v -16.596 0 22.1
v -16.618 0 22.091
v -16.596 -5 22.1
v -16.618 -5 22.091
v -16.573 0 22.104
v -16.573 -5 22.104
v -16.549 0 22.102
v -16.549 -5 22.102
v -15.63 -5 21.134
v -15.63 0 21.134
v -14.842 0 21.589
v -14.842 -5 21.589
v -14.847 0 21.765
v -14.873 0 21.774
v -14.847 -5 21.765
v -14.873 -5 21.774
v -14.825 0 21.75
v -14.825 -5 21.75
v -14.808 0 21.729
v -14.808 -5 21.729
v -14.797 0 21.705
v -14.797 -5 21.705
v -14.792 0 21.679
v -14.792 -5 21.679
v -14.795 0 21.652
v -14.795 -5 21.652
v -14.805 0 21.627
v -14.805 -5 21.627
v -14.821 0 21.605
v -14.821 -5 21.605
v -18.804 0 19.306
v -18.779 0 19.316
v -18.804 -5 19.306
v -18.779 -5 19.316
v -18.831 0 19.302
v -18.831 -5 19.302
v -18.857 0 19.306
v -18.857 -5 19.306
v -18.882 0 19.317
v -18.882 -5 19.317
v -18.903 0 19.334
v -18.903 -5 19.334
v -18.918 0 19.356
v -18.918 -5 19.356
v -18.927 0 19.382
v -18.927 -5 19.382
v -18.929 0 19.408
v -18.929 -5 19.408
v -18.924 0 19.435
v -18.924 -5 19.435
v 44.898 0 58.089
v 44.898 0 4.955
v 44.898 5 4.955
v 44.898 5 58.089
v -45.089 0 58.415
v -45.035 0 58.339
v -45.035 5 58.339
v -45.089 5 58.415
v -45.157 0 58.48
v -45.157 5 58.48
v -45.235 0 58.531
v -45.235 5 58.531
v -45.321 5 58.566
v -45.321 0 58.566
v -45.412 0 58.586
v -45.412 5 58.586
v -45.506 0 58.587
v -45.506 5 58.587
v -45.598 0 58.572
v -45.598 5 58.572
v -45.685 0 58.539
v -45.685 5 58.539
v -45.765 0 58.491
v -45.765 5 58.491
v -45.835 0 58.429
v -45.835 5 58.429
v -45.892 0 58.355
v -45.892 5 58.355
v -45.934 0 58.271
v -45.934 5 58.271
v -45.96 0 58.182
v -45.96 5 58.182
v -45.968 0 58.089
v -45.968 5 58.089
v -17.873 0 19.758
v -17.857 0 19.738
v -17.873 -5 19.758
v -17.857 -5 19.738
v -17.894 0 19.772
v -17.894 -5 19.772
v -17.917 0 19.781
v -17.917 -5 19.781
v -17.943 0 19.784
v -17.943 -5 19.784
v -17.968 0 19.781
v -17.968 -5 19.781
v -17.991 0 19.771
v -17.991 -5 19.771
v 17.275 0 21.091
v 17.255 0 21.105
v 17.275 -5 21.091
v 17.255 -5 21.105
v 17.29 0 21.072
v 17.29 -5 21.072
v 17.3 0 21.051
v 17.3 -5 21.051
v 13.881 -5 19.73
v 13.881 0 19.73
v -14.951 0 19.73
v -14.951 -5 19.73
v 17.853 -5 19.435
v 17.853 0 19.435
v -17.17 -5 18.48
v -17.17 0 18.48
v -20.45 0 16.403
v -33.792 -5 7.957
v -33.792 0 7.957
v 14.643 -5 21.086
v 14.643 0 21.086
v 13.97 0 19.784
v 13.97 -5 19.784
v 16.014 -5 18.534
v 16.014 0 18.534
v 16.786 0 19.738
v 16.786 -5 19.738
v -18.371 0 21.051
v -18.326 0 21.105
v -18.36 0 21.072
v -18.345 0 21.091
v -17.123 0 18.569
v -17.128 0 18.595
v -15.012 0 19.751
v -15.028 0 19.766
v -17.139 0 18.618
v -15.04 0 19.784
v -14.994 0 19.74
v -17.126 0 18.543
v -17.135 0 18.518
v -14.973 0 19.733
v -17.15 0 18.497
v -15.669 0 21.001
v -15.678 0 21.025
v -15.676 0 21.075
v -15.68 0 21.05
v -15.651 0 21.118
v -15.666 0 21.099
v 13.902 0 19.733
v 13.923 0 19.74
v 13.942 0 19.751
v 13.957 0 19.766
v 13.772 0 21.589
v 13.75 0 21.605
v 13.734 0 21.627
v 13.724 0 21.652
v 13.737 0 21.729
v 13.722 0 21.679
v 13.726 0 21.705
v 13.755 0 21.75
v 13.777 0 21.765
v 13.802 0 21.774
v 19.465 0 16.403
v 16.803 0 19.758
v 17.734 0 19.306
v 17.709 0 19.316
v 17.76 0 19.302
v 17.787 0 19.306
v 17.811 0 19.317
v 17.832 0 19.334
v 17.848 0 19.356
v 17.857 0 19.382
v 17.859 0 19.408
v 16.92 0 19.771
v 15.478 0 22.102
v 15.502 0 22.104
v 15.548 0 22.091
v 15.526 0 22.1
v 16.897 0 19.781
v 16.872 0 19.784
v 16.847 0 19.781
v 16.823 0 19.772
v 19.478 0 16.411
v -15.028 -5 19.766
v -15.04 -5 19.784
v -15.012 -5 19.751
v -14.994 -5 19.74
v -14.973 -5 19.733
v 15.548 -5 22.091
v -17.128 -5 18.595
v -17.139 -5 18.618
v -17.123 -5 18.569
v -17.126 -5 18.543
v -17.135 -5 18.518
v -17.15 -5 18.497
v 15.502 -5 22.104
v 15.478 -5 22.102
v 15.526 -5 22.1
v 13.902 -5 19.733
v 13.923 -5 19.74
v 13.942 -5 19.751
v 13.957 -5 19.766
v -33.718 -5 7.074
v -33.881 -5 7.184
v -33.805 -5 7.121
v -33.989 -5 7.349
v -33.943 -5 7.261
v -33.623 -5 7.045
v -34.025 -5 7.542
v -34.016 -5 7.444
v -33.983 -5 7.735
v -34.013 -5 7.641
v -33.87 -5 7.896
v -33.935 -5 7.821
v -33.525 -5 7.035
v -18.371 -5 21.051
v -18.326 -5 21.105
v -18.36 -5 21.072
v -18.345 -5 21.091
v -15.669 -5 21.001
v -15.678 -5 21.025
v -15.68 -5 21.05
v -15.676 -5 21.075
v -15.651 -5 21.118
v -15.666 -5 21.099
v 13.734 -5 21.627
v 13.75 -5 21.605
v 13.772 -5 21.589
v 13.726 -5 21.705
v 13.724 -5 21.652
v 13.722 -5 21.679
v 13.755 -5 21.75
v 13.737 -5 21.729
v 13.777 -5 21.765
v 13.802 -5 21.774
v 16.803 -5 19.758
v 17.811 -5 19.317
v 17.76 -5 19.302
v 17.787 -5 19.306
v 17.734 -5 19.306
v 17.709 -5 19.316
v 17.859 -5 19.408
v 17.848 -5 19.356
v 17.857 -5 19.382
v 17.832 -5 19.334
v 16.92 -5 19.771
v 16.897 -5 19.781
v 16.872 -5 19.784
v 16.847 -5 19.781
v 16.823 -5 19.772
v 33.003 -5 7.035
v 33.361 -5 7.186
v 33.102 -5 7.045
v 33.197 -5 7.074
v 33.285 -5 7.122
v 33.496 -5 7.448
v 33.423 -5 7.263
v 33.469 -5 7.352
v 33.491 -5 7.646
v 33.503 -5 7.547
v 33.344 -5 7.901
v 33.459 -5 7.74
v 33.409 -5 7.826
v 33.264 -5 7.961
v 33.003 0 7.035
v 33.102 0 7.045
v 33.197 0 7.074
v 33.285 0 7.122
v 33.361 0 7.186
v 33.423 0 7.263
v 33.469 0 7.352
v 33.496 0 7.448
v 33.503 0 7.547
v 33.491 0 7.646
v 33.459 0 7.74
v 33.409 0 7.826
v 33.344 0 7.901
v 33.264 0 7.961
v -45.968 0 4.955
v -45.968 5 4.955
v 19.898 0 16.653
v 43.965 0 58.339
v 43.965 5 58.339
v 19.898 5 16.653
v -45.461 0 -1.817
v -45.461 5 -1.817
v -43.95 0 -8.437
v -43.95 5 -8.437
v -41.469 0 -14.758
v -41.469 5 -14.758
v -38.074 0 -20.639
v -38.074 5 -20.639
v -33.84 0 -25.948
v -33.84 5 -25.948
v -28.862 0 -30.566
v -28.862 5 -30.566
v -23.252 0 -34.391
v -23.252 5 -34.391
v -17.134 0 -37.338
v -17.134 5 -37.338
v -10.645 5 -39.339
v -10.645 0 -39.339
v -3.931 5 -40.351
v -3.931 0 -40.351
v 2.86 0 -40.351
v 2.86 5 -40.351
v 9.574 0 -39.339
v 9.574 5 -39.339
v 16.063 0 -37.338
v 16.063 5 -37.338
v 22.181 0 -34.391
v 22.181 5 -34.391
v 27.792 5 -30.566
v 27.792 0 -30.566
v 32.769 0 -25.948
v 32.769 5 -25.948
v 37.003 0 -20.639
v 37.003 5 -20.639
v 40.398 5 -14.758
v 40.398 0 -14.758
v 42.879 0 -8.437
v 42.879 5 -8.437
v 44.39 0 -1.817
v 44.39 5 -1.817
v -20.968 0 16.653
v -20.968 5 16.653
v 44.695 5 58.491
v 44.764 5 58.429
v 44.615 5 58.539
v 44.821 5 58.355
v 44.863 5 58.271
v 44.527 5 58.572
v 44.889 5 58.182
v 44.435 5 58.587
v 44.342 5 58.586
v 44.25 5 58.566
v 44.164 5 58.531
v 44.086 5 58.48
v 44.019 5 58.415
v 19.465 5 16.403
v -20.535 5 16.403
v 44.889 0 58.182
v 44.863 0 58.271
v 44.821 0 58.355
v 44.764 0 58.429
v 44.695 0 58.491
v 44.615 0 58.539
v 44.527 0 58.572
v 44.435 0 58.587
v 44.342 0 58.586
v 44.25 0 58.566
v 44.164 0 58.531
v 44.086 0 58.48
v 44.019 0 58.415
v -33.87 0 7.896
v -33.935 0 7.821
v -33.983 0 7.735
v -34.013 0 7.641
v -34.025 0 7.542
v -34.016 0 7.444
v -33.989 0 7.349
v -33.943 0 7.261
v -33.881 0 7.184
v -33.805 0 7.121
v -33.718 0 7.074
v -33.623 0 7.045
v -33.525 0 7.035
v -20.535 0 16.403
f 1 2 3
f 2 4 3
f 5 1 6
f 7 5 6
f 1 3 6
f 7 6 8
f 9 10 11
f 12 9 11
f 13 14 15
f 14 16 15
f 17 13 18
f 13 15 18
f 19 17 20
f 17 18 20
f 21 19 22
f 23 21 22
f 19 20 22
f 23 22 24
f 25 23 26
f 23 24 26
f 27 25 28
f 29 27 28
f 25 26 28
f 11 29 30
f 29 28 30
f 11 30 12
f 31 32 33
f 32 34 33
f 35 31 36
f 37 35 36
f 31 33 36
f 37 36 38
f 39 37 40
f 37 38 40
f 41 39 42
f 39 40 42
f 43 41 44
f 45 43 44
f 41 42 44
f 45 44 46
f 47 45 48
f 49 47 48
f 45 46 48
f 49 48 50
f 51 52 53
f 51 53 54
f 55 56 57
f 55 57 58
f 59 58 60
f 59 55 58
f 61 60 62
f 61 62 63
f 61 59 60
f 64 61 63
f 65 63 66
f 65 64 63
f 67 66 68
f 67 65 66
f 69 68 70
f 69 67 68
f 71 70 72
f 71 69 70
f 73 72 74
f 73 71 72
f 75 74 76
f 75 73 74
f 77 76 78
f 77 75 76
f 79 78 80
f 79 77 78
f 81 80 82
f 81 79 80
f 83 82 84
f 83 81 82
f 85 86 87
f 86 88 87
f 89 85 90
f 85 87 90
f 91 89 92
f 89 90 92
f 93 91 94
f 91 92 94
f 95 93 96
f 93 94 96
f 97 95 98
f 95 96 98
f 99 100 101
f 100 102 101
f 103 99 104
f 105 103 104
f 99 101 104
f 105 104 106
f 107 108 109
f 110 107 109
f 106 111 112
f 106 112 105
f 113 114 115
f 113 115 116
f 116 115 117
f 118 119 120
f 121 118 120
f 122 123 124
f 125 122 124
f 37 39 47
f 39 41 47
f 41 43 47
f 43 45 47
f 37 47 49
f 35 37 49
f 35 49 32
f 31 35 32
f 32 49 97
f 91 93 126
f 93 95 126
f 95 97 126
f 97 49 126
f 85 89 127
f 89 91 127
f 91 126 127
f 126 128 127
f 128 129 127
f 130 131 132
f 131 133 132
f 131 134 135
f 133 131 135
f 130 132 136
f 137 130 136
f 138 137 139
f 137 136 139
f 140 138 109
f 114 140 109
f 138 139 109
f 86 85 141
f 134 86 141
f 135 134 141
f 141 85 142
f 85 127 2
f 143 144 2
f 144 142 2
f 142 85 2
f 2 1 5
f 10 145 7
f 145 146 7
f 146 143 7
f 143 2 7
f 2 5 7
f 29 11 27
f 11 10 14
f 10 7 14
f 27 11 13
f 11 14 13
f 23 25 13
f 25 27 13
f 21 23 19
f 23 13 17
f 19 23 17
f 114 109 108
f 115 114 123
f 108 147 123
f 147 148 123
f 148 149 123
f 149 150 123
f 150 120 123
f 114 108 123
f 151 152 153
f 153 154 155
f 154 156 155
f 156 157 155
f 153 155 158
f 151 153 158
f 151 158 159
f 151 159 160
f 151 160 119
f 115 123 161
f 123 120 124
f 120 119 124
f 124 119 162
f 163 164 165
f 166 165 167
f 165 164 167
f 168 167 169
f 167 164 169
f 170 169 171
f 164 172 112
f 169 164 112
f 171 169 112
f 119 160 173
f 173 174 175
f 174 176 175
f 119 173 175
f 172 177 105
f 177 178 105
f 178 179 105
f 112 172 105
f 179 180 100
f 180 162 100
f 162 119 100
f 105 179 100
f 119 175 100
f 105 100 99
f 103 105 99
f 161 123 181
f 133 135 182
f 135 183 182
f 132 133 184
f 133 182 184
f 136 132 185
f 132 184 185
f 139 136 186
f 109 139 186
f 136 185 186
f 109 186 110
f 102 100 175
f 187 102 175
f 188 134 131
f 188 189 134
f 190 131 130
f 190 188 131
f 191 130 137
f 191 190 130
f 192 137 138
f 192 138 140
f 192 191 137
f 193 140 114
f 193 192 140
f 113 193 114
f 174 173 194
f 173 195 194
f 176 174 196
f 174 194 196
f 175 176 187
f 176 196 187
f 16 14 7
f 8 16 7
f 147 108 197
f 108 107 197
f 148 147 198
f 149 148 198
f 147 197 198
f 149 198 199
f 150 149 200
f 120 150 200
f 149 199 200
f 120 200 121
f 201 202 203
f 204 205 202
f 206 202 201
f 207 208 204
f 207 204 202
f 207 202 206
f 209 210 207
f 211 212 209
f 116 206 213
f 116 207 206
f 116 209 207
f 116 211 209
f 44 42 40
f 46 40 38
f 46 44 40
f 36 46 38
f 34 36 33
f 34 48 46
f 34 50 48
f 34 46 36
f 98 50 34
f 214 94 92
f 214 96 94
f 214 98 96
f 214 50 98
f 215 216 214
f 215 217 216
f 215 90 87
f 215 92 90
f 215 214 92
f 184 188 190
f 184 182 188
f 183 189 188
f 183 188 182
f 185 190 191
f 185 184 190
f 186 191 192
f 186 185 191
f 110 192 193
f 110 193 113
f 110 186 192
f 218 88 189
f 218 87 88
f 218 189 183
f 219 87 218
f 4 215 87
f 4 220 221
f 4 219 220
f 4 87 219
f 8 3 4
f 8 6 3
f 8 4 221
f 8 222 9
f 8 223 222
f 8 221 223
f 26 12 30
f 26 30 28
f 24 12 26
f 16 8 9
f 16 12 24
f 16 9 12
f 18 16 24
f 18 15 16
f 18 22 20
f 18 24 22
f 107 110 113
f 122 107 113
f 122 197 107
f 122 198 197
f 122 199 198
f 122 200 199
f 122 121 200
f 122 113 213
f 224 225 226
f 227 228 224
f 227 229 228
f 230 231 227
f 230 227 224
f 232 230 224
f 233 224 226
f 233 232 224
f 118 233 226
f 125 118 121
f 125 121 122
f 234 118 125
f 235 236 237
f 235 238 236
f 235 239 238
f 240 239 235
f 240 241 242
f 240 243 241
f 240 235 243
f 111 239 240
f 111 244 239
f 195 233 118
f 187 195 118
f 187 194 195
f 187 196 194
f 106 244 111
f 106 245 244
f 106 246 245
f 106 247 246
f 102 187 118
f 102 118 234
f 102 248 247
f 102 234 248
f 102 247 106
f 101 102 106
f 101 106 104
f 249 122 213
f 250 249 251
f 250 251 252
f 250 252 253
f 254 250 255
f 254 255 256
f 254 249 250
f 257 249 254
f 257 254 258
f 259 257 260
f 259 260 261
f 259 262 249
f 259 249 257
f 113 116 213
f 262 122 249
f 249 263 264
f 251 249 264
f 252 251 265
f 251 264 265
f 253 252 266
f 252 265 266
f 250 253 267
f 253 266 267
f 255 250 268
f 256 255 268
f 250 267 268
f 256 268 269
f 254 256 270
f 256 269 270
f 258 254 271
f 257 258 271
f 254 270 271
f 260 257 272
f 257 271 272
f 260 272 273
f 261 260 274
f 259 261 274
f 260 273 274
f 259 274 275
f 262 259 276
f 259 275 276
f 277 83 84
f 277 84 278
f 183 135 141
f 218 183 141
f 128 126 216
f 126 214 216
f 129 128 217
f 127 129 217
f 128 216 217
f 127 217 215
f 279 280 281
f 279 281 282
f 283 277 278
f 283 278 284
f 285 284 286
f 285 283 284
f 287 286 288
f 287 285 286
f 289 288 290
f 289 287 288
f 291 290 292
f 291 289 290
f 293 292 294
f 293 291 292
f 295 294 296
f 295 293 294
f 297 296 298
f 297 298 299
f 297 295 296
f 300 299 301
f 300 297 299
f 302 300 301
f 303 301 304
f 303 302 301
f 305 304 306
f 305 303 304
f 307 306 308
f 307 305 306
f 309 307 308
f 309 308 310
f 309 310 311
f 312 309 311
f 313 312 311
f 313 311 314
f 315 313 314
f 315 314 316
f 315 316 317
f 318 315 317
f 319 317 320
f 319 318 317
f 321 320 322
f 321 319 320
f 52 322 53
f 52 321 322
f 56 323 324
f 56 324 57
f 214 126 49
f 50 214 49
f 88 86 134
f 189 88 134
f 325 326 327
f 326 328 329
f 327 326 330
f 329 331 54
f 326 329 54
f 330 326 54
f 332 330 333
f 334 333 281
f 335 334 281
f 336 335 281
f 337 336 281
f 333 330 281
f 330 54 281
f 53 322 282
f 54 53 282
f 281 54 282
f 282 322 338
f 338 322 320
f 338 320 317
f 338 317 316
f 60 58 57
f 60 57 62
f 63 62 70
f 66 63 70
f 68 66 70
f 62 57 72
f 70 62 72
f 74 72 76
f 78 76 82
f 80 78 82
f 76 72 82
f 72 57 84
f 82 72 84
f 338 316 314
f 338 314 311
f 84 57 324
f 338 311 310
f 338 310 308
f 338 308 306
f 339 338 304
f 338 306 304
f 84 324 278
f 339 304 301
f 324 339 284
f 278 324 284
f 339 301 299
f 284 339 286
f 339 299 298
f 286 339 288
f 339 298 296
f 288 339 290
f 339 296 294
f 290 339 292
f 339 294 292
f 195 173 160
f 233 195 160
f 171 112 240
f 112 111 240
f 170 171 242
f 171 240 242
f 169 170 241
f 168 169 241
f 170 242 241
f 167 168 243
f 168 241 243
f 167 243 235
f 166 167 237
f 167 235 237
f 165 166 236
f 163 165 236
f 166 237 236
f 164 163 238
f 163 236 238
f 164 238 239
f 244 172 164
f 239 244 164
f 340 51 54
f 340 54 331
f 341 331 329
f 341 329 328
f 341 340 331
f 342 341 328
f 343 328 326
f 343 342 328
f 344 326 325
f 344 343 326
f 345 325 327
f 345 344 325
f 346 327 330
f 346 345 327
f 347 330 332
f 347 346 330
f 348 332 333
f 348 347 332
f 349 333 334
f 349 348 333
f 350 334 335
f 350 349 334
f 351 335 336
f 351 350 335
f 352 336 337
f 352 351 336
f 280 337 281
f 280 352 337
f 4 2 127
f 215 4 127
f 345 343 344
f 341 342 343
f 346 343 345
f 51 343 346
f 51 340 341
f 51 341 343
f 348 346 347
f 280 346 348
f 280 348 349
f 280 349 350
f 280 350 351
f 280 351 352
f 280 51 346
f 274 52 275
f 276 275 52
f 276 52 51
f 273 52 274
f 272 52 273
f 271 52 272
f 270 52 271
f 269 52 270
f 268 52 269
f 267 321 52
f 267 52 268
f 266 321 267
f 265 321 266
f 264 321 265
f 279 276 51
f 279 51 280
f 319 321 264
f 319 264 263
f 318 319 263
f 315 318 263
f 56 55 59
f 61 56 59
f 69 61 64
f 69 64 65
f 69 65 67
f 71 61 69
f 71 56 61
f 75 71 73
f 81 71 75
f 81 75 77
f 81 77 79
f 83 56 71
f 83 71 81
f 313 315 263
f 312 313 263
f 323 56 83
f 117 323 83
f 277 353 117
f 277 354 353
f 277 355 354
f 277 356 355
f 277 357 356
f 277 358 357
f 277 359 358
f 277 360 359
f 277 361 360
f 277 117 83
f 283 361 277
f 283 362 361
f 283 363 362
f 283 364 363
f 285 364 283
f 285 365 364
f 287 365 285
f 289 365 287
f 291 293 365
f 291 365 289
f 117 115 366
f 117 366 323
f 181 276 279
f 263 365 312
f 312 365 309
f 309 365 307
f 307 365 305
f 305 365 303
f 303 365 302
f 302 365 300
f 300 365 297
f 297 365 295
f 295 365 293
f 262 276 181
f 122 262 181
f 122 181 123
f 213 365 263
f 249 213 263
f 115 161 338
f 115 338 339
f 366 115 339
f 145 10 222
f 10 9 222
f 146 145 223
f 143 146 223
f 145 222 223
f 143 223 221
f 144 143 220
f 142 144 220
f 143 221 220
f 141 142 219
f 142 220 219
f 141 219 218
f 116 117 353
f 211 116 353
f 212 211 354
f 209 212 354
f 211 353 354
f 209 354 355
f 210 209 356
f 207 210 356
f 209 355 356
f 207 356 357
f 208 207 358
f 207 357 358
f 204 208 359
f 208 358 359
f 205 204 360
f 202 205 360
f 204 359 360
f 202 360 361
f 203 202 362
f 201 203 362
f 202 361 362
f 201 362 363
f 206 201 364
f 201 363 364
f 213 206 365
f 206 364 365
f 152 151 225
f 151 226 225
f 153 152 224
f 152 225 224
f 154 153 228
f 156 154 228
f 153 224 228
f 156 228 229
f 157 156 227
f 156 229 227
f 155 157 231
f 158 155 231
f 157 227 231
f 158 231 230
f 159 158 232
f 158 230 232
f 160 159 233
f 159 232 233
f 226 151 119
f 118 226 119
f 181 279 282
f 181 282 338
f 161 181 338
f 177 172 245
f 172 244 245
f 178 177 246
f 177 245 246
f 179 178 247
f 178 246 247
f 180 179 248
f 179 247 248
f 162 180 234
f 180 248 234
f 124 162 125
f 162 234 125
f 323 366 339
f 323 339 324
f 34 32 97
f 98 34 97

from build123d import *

# Parameters (mm, degrees)
BOSS_EXTRU_1_DEPTH = 5
BOSS_EXTRU_2_DEPTH = 5
CONG_1_R           = 0.1


with BuildPart() as part:
    # Esquisse1 → Boss.-Extru.1 (new body)
    with BuildSketch(Plane(origin=(0, 0, 0), x_dir=(1, 0, 0), z_dir=(0, 1, 0))):
        with BuildLine():
            Line((19.464682141, -16.403463282), (-20.535317859, -16.403463282))
            Line((-20.535317859, -16.403463282), (-20.968330561, -16.653463282))
            Line((-20.968330561, -16.653463282), (-45.035317859, -58.338708067))
            ThreePointArc((-45.035317859, -58.338708067), (-45.597740084, -58.57167098), (-45.968330561, -58.088708067))
            Line((-45.968330561, -58.088708067), (-45.968330561, -4.954733471))
            ThreePointArc((-45.968330561, -4.954733471), (-0.535317859, 40.478279231), (44.897694842, -4.954733471))
            Line((44.897694842, -4.954733471), (44.897694842, -58.088708067))
            ThreePointArc((44.897694842, -58.088708067), (44.527104365, -58.57167098), (43.964682141, -58.338708067))
            Line((43.964682141, -58.338708067), (19.897694842, -16.653463282))
            Line((19.897694842, -16.653463282), (19.464682141, -16.403463282))
        make_face()
    extrude(amount=BOSS_EXTRU_1_DEPTH)

    # Esquisse3 → Boss.-Extru.2 (add)
    with BuildSketch(Plane.XZ):
        with BuildLine():
            Line((-17.908394248, 19.818657818), (-17.084754205, 18.533779345))
            Line((-17.084754205, 18.533779345), (-33.79214282, 7.957290442))
            ThreePointArc((-33.79214282, 7.957290442), (-34.004929664, 7.395599901), (-33.524704444, 7.034825396))
            Line((-33.524704444, 7.034825396), (33.003204413, 7.034825396))
            ThreePointArc((33.003204413, 7.034825396), (33.484427413, 7.399088796), (33.264482707, 7.961127698))
            Line((33.264482707, 7.961127698), (16.014118486, 18.533779345))
            Line((16.014118486, 18.533779345), (16.837758529, 19.818657818))
            Line((16.837758529, 19.818657818), (17.939784376, 19.182402899))
            Line((17.939784376, 19.182402899), (17.287895758, 21.086077969))
            Line((17.287895758, 21.086077969), (15.515071867, 22.109618319))
            Line((15.515071867, 22.109618319), (13.540496587, 21.722332888))
            Line((13.540496587, 21.722332888), (14.642522434, 21.086077969))
            Line((14.642522434, 21.086077969), (13.941605057, 19.730345531))
            Line((13.941605057, 19.730345531), (-15.012240776, 19.730345531))
            Line((-15.012240776, 19.730345531), (-15.713158153, 21.086077969))
            Line((-15.713158153, 21.086077969), (-14.611132306, 21.722332888))
            Line((-14.611132306, 21.722332888), (-16.585707586, 22.109618319))
            Line((-16.585707586, 22.109618319), (-18.358531477, 21.086077969))
            Line((-18.358531477, 21.086077969), (-19.010420095, 19.182402899))
            Line((-19.010420095, 19.182402899), (-17.908394248, 19.818657818))
        make_face()
    extrude(amount=BOSS_EXTRU_2_DEPTH)

    # Congé1
    cong_1_edges = [part.edges().sort_by_distance(p)[0] for p in [
        (16.837758529, -2.5, 19.818657818),
        (17.939784376, -2.5, 19.182402899),
        (17.287895758, -2.5, 21.086077969),
        (15.515071867, -2.5, 22.109618319),
        (13.540496587, -2.5, 21.722332888),
        (13.941605057, -2.5, 19.730345531),
        (-15.012240776, -2.5, 19.730345531),
        (-15.713158153, -2.5, 21.086077969),
        (-14.611132306, -2.5, 21.722332888),
        (-16.585707586, -2.5, 22.109618319),
        (-18.358531477, -2.5, 21.086077969),
        (-19.010420095, -2.5, 19.182402899),
        (-17.908394248, -2.5, 19.818657818),
        (-17.084754205, -2.5, 18.533779345),
    ]]
    fillet(cong_1_edges, radius=CONG_1_R)


solid = part.part
